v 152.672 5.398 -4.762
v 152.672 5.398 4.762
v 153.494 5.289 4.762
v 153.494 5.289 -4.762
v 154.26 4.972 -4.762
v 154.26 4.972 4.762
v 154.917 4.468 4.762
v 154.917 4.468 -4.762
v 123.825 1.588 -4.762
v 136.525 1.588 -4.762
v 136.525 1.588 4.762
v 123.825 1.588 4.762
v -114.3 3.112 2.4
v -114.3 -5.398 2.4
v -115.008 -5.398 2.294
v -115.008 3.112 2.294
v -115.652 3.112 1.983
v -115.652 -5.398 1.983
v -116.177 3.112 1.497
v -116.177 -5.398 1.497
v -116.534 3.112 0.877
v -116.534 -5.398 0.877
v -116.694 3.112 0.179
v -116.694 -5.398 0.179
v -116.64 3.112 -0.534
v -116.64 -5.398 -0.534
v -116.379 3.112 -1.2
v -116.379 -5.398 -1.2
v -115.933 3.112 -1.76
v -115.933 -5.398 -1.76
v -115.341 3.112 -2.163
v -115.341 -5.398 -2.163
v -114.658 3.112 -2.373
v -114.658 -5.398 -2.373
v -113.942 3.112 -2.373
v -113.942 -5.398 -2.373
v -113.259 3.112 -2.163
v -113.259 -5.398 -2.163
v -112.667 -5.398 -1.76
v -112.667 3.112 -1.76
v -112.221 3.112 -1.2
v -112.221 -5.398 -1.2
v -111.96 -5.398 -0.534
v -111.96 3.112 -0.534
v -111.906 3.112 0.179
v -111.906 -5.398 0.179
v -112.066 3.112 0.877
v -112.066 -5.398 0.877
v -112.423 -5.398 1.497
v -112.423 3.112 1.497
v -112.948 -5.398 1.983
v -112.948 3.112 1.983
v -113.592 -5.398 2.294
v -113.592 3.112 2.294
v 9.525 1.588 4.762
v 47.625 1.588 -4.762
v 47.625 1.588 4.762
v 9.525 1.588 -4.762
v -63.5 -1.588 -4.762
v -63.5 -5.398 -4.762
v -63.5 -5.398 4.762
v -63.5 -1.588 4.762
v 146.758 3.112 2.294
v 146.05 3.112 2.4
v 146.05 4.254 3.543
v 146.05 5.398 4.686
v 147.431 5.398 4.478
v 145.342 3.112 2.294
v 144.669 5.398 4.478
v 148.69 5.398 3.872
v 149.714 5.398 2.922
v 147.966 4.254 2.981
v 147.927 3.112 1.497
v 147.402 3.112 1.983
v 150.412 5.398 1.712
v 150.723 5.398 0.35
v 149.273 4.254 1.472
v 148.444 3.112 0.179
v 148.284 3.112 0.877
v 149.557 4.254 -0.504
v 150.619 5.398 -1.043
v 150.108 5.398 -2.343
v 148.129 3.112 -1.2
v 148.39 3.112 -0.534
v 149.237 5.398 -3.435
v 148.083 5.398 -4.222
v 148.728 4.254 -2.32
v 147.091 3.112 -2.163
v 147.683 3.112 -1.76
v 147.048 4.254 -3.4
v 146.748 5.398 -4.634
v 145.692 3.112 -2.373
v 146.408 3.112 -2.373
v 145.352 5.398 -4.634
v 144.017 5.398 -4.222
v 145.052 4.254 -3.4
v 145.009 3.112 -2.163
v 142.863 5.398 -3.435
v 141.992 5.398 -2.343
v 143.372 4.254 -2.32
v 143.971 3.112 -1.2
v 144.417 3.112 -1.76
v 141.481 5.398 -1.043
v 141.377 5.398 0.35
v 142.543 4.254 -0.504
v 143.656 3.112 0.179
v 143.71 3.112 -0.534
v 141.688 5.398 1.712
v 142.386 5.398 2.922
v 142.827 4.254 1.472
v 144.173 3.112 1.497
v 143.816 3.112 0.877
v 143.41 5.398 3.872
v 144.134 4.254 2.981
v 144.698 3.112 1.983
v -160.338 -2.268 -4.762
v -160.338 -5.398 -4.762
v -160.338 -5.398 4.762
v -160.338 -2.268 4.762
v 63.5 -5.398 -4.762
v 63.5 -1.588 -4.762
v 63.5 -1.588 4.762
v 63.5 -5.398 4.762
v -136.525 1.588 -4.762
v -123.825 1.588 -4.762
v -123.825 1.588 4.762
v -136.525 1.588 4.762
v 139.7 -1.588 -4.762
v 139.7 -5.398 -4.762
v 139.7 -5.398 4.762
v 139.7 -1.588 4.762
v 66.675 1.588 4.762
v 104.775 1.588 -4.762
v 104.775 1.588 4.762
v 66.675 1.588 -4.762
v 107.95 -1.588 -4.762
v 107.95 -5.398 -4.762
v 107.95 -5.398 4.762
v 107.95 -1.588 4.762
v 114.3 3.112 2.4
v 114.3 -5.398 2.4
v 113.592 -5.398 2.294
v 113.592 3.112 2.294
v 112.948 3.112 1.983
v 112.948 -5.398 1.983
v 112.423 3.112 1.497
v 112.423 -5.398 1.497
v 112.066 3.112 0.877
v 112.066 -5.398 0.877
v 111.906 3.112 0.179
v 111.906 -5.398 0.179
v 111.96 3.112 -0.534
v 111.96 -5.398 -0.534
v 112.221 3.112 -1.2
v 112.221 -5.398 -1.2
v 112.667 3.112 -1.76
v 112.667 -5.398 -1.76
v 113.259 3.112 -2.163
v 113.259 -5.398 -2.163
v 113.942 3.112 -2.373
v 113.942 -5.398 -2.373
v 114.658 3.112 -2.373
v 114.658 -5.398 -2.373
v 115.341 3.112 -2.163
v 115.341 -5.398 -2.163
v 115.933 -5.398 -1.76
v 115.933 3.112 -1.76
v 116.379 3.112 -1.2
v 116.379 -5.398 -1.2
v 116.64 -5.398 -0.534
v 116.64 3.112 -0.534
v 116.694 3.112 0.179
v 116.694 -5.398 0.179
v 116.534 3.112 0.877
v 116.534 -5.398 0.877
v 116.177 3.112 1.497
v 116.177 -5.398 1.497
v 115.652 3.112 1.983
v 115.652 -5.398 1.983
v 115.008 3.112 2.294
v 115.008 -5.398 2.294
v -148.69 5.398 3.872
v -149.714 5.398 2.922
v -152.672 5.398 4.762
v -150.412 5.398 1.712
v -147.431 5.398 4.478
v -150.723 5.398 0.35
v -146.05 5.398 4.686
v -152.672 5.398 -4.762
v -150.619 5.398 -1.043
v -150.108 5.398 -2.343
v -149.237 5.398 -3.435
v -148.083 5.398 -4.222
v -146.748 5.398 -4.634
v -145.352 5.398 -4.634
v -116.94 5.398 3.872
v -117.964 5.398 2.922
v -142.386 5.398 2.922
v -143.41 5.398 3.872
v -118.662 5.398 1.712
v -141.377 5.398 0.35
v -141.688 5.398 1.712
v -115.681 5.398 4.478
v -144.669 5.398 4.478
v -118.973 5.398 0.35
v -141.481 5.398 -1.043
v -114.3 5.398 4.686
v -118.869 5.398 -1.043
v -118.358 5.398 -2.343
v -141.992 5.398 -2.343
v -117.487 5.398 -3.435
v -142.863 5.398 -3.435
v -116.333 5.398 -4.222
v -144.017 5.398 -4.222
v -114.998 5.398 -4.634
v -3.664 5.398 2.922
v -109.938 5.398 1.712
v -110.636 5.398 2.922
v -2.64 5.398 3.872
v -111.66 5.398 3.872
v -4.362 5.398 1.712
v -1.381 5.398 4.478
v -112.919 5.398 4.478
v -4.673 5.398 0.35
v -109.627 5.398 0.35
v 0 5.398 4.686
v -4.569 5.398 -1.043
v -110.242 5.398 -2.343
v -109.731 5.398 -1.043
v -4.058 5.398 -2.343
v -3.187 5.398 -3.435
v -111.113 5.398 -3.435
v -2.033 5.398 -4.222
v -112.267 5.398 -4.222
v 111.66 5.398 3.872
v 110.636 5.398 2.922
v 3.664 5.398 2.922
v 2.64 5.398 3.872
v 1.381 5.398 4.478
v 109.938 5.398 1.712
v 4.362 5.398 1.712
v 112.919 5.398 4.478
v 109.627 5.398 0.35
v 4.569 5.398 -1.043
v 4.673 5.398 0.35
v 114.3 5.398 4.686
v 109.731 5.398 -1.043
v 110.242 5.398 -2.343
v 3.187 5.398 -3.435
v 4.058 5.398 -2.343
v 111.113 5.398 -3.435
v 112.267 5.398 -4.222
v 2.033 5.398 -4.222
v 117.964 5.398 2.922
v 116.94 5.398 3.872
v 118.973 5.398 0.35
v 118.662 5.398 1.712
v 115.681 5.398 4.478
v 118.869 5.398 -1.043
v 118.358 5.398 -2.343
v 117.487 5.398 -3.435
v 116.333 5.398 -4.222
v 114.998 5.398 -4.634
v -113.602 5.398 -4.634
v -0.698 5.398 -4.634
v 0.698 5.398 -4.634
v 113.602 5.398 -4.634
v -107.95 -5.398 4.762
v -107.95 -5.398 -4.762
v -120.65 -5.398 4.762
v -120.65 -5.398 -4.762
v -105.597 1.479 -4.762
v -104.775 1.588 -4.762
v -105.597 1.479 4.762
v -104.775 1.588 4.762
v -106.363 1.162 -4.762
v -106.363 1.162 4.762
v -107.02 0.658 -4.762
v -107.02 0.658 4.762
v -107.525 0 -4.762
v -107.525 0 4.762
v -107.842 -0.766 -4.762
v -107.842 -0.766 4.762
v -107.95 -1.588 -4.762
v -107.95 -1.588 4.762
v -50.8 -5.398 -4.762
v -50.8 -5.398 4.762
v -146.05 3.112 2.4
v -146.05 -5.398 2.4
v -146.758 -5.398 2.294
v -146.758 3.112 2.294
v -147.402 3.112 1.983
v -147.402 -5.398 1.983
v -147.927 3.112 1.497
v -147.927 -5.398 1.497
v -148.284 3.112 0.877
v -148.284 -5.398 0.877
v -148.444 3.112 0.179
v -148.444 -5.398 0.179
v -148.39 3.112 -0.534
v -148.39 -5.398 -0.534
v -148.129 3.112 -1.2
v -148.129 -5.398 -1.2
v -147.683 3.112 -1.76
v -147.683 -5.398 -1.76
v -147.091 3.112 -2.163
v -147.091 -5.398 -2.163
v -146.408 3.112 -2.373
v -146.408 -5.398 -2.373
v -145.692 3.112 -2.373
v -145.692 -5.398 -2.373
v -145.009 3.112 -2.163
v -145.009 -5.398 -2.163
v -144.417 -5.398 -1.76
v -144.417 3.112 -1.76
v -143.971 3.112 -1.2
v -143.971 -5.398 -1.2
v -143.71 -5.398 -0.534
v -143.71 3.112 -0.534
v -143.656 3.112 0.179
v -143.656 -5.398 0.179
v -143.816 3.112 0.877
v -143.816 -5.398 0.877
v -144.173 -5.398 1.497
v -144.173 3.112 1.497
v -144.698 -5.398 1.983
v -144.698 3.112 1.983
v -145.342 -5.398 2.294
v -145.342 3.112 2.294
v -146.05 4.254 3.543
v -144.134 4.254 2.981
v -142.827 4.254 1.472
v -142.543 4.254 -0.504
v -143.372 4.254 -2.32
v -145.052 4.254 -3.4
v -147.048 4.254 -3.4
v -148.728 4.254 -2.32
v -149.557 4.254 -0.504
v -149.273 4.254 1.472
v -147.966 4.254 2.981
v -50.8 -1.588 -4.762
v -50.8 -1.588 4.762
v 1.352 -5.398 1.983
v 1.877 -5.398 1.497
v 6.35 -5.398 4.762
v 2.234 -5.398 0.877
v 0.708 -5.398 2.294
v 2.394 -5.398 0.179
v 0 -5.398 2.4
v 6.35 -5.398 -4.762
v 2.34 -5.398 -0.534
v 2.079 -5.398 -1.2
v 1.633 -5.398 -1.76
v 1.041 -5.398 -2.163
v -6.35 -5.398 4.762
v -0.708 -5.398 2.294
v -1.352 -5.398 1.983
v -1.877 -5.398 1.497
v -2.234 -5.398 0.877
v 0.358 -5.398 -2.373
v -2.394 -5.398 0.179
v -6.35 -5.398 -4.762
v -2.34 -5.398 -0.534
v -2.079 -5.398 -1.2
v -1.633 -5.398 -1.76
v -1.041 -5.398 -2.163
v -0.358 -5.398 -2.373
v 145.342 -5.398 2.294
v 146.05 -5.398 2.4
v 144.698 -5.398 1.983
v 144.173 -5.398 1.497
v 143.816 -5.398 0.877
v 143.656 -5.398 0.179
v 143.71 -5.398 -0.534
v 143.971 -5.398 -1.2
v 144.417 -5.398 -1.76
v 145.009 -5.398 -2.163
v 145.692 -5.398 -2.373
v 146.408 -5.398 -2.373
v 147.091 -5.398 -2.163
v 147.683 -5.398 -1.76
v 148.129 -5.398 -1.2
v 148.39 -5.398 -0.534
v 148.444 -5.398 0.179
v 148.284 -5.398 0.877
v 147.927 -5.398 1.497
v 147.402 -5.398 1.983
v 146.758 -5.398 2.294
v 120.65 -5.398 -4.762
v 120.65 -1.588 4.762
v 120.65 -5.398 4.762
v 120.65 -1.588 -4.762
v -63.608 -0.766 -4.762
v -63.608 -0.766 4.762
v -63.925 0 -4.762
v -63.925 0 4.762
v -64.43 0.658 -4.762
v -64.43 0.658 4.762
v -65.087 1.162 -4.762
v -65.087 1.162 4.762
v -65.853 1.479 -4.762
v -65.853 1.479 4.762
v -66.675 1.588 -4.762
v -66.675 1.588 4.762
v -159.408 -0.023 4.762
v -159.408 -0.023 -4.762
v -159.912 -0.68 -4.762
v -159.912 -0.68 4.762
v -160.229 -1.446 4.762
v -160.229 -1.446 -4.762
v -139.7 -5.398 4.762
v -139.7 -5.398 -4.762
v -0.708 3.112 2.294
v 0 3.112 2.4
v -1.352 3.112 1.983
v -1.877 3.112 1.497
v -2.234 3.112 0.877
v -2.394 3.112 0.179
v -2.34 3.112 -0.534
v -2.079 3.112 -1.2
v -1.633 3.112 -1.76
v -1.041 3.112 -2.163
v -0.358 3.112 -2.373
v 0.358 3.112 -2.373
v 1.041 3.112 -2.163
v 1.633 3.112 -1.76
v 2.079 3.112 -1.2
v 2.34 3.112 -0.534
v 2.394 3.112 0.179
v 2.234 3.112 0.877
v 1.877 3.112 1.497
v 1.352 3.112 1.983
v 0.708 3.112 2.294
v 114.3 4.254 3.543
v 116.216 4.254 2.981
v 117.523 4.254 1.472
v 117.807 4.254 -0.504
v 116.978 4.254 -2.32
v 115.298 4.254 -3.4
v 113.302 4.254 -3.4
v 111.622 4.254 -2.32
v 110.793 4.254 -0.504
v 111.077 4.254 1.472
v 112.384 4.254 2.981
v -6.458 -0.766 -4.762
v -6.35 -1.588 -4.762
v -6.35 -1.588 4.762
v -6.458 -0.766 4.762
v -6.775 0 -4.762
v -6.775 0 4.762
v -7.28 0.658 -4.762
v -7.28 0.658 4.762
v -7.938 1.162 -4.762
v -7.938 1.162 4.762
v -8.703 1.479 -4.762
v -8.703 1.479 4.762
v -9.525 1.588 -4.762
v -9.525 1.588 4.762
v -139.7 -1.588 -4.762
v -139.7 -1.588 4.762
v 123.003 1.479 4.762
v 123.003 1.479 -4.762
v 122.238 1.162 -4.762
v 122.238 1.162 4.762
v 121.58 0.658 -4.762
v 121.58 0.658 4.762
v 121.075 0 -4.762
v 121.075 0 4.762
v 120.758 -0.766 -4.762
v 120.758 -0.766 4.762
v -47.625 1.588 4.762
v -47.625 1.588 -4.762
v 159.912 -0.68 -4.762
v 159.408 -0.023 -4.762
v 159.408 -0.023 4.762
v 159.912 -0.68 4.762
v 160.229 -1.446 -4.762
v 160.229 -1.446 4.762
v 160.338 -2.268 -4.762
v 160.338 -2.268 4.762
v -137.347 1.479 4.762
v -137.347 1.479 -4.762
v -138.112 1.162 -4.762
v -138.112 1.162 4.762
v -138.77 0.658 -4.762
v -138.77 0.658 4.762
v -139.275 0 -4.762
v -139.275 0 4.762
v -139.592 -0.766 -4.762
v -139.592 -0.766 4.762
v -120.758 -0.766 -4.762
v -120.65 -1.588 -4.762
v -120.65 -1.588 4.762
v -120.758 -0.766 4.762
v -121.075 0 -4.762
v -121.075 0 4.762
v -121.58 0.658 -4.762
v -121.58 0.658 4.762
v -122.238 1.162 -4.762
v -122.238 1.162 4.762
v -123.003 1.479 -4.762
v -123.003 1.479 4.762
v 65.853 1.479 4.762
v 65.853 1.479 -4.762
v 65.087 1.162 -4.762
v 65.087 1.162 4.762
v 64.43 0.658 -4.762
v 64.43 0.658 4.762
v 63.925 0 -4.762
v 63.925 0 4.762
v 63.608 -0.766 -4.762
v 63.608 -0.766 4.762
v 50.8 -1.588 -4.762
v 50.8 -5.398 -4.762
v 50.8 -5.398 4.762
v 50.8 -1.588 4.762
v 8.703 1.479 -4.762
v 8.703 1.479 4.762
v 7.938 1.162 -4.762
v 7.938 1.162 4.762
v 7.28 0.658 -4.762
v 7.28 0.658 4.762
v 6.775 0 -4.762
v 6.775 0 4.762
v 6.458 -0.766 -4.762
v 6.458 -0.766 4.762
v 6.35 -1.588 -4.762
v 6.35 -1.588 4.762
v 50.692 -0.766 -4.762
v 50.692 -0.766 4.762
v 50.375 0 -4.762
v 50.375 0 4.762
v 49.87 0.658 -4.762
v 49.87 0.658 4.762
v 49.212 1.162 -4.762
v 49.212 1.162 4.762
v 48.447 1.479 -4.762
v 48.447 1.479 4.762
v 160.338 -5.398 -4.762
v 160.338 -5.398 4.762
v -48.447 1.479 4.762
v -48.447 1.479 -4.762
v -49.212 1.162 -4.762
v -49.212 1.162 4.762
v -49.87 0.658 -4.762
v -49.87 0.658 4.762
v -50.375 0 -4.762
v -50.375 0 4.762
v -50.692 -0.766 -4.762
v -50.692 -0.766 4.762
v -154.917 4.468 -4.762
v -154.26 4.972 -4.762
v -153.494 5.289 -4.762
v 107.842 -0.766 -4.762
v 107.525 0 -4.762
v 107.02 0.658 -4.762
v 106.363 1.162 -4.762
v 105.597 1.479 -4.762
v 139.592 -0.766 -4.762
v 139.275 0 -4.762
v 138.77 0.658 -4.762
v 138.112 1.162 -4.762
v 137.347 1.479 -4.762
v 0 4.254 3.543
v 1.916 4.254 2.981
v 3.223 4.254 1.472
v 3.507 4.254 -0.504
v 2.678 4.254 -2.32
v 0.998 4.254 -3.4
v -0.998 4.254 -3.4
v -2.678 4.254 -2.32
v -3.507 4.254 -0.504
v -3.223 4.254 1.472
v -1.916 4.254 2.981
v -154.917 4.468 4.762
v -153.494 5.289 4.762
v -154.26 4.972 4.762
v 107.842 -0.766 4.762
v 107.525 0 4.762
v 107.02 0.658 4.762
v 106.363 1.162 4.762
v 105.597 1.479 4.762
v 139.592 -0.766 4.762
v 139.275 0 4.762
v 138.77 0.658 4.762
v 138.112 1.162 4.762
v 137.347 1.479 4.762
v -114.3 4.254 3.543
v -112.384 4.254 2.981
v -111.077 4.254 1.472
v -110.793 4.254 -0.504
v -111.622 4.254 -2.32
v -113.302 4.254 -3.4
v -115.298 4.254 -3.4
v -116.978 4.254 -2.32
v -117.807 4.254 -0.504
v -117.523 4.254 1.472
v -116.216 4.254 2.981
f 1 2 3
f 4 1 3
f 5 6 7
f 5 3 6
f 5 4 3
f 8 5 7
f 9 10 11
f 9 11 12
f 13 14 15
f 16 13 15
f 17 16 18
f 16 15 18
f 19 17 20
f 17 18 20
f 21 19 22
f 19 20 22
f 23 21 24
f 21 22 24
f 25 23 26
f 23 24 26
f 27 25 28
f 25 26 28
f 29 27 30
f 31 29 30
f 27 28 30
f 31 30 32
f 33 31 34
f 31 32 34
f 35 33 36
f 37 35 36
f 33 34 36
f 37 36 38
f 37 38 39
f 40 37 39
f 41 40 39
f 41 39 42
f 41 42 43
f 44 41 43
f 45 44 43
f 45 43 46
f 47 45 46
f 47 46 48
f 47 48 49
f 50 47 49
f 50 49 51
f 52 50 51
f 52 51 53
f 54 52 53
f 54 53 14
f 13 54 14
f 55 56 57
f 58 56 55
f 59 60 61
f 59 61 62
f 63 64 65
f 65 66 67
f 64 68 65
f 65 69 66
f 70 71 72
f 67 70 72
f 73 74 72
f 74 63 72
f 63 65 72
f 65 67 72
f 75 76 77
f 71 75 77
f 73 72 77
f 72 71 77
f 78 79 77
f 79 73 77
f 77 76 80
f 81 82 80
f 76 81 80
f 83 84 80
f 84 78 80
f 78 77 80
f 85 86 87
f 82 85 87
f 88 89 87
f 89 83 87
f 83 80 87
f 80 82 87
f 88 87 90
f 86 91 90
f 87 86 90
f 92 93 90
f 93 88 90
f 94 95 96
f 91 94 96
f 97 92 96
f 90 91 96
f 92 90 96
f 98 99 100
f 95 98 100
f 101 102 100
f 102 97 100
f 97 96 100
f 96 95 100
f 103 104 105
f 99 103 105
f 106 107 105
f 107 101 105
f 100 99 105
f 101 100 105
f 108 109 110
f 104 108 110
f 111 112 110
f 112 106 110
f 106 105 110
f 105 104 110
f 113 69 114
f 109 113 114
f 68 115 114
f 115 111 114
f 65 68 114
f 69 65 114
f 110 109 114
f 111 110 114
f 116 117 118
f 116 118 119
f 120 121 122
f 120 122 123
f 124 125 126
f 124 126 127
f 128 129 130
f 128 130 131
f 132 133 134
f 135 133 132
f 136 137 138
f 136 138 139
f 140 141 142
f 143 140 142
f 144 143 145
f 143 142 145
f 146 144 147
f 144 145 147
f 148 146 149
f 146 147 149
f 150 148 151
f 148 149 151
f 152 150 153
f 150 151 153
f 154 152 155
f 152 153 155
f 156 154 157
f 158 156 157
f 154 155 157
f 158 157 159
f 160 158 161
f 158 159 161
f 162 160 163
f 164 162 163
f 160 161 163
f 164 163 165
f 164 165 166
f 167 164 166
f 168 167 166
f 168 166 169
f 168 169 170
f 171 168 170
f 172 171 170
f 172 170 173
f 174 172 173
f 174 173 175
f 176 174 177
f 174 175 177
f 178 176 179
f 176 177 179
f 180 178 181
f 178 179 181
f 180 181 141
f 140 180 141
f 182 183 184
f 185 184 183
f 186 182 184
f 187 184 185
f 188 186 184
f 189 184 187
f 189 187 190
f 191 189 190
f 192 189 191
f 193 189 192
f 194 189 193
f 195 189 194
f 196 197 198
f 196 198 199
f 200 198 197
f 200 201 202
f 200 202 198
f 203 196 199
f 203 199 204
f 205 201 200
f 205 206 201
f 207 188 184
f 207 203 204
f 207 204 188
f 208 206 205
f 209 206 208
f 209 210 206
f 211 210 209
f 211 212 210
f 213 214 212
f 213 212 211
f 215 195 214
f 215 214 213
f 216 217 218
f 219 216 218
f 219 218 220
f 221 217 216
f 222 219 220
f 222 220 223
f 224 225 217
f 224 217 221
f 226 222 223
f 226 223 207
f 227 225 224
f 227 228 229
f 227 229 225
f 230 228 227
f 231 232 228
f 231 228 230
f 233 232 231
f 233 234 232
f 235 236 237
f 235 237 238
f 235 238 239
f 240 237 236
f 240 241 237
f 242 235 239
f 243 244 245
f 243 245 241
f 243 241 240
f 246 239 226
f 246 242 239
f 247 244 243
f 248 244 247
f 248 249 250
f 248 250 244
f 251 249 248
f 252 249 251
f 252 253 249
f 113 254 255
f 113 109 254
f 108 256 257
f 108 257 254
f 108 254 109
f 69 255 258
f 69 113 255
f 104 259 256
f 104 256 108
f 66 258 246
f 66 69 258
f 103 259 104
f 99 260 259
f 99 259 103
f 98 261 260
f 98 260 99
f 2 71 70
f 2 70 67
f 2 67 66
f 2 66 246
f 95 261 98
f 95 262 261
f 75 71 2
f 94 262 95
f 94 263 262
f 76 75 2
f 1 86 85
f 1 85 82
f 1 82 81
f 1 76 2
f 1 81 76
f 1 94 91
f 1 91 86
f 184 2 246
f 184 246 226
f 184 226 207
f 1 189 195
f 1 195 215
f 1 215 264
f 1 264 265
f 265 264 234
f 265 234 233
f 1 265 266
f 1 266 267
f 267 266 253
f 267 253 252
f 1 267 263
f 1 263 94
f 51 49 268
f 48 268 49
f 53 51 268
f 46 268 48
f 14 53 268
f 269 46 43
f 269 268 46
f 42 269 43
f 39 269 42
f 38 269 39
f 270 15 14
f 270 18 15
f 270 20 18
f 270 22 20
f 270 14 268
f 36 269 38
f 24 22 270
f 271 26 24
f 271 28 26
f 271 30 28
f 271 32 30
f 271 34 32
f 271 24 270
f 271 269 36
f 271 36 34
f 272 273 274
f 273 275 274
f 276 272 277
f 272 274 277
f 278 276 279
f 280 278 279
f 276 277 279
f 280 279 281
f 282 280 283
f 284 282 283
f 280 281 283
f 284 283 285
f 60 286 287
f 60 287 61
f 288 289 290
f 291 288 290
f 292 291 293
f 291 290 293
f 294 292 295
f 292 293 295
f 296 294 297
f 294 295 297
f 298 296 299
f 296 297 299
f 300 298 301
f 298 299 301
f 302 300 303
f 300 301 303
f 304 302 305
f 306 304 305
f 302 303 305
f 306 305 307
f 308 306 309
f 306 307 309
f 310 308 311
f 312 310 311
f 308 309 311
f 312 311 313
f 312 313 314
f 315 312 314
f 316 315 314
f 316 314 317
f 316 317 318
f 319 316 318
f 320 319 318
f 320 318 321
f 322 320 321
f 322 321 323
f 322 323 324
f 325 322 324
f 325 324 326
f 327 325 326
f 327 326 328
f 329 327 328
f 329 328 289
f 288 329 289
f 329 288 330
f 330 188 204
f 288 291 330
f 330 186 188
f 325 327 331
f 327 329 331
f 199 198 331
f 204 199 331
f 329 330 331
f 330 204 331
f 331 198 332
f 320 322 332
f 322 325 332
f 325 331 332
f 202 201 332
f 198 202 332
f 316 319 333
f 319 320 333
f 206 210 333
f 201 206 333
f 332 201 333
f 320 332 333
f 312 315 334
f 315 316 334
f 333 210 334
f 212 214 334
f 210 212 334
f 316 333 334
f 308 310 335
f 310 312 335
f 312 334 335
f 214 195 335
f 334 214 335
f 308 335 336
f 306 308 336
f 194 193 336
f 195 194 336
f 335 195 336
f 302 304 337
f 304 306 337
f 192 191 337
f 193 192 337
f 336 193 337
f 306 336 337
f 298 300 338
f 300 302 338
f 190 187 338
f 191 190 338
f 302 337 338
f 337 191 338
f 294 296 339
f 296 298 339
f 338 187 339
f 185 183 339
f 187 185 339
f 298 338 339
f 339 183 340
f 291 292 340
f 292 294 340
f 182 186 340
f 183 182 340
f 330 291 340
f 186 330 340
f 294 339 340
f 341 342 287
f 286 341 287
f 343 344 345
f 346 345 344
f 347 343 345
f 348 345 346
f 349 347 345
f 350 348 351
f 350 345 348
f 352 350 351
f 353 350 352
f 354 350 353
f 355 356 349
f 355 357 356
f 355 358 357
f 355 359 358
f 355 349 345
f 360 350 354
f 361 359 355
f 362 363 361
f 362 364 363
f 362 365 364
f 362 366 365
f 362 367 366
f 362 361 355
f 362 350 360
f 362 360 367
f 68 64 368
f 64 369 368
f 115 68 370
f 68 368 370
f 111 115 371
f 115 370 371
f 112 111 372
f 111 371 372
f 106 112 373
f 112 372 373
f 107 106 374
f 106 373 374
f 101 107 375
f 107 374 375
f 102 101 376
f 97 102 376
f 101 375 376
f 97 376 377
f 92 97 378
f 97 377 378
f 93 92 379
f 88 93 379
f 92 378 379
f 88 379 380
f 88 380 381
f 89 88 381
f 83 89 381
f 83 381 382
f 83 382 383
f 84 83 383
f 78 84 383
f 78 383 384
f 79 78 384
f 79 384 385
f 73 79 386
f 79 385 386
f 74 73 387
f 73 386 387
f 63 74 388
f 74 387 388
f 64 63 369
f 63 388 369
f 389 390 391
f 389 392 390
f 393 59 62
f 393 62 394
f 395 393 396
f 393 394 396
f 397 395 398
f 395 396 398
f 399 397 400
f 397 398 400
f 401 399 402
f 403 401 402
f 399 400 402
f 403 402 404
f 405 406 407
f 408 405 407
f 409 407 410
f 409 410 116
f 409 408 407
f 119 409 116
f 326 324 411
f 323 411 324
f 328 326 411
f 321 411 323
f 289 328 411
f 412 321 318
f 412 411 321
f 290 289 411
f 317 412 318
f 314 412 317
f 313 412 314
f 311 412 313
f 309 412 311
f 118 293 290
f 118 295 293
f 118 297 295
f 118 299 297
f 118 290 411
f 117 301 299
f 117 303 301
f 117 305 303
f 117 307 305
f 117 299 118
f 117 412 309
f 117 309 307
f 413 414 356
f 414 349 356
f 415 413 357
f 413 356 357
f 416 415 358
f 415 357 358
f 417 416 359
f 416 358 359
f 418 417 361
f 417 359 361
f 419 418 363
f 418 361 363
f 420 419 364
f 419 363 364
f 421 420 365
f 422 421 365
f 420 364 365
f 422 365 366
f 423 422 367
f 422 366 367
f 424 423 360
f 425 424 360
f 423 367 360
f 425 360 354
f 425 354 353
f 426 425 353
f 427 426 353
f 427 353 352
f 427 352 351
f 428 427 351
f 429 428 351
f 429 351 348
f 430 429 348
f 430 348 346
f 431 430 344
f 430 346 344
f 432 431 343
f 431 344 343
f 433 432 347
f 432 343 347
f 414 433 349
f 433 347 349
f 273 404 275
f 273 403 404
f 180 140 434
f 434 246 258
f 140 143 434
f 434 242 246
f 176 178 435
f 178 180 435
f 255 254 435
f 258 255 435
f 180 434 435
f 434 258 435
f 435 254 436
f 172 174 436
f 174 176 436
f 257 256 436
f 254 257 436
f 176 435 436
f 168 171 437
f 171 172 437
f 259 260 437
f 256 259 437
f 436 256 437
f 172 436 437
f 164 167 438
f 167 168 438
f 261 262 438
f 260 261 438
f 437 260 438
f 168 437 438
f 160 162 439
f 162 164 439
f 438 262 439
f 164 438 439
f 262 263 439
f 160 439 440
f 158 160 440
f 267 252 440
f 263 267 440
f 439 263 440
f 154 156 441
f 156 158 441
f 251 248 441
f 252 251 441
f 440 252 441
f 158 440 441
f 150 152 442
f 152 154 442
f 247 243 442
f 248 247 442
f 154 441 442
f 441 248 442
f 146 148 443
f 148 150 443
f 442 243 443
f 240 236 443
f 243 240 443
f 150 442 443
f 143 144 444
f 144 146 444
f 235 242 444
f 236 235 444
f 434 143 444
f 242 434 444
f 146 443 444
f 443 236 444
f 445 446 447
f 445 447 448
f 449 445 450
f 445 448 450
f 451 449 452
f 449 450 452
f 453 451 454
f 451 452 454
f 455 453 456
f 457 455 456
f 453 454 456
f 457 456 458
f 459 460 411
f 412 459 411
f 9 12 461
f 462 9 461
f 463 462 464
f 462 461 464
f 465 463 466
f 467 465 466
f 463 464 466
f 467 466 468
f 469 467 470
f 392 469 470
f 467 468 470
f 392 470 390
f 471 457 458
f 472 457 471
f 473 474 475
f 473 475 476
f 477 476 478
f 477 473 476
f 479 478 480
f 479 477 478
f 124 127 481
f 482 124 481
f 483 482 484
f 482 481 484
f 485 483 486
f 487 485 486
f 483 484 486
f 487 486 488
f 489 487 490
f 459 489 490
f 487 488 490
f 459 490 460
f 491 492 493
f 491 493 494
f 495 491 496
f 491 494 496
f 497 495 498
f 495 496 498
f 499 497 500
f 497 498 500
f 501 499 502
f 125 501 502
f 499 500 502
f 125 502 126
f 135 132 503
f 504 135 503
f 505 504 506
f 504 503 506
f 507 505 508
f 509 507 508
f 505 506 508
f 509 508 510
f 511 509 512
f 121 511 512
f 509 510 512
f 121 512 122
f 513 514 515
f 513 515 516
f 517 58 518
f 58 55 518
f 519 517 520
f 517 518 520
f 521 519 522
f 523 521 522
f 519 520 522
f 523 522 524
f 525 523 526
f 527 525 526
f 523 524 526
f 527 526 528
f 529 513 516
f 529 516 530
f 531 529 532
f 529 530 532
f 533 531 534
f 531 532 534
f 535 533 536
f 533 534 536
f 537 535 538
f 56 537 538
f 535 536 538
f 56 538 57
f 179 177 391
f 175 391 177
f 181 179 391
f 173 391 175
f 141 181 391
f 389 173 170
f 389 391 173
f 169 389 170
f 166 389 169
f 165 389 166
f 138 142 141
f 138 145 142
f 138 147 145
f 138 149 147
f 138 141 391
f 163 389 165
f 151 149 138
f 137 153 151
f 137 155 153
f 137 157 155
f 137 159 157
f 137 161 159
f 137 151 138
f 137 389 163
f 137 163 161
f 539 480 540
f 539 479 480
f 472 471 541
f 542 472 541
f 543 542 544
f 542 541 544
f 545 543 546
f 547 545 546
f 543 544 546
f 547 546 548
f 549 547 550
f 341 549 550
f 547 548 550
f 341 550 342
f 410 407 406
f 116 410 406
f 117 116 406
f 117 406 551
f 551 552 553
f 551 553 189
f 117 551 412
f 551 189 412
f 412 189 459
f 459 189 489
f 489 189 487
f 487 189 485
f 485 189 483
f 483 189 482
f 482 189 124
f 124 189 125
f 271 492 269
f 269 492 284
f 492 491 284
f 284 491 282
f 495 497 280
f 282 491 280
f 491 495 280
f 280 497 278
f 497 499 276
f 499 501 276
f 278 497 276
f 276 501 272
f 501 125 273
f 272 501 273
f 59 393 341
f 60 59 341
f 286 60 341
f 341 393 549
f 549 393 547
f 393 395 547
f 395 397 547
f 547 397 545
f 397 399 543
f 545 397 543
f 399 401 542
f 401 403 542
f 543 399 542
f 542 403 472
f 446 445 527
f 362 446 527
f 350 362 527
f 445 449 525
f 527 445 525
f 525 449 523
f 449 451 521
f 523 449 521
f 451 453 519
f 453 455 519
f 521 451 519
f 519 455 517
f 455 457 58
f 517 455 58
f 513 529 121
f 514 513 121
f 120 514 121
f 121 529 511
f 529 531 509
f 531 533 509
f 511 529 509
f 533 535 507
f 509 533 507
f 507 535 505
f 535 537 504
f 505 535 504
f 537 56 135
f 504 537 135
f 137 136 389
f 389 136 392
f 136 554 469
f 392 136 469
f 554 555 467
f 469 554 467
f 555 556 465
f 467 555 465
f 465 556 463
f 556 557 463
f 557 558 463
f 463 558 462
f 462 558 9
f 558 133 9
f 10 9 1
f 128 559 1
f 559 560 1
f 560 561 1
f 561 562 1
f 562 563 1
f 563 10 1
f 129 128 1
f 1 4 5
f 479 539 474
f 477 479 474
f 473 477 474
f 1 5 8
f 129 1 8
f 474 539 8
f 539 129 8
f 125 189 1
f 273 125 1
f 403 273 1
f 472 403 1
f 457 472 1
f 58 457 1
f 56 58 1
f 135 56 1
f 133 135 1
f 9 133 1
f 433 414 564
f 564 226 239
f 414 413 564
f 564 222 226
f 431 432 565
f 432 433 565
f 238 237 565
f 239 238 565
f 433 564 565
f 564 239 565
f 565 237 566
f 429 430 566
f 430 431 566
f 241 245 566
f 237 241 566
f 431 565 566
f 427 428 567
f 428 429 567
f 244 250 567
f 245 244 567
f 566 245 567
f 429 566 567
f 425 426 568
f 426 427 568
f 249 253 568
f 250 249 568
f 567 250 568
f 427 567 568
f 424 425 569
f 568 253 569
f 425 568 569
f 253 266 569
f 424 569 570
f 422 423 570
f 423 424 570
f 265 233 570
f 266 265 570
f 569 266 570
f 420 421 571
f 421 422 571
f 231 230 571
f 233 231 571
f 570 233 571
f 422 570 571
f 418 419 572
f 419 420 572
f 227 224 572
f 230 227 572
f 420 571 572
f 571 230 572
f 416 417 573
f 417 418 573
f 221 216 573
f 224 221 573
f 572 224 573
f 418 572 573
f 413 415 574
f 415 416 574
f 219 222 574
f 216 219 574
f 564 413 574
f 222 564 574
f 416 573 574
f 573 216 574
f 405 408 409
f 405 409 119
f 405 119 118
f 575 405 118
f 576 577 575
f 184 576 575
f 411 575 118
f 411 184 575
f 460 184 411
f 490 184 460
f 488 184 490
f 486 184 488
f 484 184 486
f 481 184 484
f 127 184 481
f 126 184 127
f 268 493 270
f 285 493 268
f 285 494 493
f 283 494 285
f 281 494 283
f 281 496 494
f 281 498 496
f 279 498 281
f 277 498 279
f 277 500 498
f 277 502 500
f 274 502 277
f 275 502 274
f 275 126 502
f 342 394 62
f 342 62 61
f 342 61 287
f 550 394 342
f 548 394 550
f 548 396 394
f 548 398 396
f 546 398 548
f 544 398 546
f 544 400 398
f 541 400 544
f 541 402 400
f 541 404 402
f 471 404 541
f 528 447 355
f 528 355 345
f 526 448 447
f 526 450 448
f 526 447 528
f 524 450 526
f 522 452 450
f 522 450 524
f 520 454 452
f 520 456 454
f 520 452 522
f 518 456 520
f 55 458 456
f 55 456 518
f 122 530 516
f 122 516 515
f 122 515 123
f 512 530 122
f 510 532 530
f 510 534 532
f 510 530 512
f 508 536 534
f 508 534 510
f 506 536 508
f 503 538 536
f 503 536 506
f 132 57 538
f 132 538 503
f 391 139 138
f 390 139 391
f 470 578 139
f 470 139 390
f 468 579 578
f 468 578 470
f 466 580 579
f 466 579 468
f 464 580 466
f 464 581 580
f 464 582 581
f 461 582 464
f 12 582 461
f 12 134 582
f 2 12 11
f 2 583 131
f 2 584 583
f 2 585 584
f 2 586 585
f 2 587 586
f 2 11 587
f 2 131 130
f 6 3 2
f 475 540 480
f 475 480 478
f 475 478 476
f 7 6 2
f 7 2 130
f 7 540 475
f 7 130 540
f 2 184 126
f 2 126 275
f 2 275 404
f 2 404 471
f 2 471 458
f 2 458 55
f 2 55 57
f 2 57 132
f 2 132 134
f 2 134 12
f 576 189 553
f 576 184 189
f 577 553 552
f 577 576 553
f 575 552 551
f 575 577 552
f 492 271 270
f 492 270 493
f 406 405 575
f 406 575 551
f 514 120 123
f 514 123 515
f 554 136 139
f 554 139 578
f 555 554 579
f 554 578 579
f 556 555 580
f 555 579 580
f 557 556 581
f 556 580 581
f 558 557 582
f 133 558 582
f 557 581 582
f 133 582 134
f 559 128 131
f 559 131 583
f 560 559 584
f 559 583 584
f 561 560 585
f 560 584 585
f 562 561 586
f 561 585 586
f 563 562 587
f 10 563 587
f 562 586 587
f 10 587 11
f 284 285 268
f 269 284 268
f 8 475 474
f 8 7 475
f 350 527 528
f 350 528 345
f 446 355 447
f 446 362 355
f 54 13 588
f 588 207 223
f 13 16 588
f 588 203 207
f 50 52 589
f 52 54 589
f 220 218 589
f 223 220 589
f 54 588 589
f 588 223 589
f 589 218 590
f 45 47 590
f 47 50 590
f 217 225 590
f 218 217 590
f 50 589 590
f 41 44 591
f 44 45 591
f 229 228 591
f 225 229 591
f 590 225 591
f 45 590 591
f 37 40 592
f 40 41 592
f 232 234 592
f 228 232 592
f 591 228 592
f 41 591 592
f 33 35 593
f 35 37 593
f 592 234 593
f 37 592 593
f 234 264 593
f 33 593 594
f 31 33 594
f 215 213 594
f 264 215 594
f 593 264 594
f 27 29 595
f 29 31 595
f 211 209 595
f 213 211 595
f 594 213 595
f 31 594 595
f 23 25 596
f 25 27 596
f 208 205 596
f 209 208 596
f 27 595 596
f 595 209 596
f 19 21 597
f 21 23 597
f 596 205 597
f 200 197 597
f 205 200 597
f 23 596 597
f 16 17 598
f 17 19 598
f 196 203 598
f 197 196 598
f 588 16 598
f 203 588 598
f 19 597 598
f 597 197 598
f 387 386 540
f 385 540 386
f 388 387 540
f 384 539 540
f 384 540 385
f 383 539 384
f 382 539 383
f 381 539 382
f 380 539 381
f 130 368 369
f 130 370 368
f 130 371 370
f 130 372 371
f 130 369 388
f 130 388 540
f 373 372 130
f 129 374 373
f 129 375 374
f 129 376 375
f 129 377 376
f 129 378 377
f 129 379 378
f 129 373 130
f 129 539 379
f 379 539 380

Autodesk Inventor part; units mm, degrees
ref_plane "YZ Plane" through (0, 0, 0) normal (1, 0, 0) x (0, 1, 0)
ref_plane "XY Plane" through (0, 0, 0) normal (0, 0, 1) x (1, 0, 0)
sketch "Sketch1" plane through (0, 0, 0) normal (0, 0, 1) x (1, 0, 0)
  line L0 (0, 7.5565) -> (0, -7.5565) projected
  line L1 (-224.4725, 0) -> (224.4725, 0) projected
  line L2 (160.3375, -5.3975) -> (-160.3375, -5.3975)
  line L3 (-160.3375, -5.3975) -> (-160.3375, 5.3975)
  line L4 (-160.3375, 5.3975) -> (160.3375, 5.3975)
  line L5 (160.3375, 5.3975) -> (160.3375, -5.3975)
  line L6 (160.3375, -5.3975) -> (-160.3375, 5.3975) construction
  line L7 (-160.3375, -5.3975) -> (160.3375, 5.3975) construction
  point P0 (0, 0)
  dimension "d0" = 320.675
  dimension "d1" = 10.795
extrude "Extrusion1" add sketch "Sketch1" along normal mid plane 9.525
sketch "Sketch2" plane through (0, 0, 0) normal (0, 0, 1) x (1, 0, 0)
  line L0 (-160.3375, 5.3975) -> (-160.3375, -5.3975) projected
  line L1 (-160.3375, -5.3975) -> (160.3375, -5.3975) projected
  line L2 (-160.3375, -5.3975) -> (160.3375, -5.3975) projected
  line L3 (160.3375, -5.3975) -> (160.3375, 5.3975) projected
  line L4 (160.3375, 5.3975) -> (-160.3375, 5.3975) projected
  line L5 (-160.3375, 5.3975) -> (-160.3375, -5.3975) projected
  line L6 (160.3375, -5.3975) -> (160.3375, 5.3975) projected
  line L7 (0, 7.5565) -> (0, -7.5565) projected
  line L8 (-139.7, -5.3975) -> (-120.65, -5.3975)
  line L9 (-120.65, -5.3975) -> (-120.65, 1.5875)
  line L10 (-120.65, 1.5875) -> (-139.7, 1.5875)
  line L11 (-139.7, 1.5875) -> (-139.7, -5.3975)
  line L12 (-107.95, -5.3975) -> (-63.5, -5.3975)
  line L13 (-63.5, -5.3975) -> (-63.5, 1.5875)
  line L14 (-63.5, 1.5875) -> (-107.95, 1.5875)
  line L15 (-107.95, 1.5875) -> (-107.95, -5.3975)
  line L16 (160.3375, 5.3975) -> (-160.3375, 5.3975) construction
  line L17 (-112.2997, -5.3975) -> (-116.3003, -5.3975) construction
  line L18 (-116.3003, -5.3975) -> (-116.3003, 5.3975) construction
  line L19 (-116.3003, 5.3975) -> (-112.2997, 5.3975) construction
  line L20 (-112.2997, 5.3975) -> (-112.2997, -5.3975) construction
  line L21 (-112.2997, -5.3975) -> (-116.3003, 5.3975) construction
  line L22 (-116.3003, -5.3975) -> (-112.2997, 5.3975) construction
  line L23 (-144.0497, -5.3975) -> (-148.0502, -5.3975) construction
  line L24 (-148.0502, -5.3975) -> (-148.0502, 5.3975) construction
  line L25 (-148.0502, 5.3975) -> (-144.0497, 5.3975) construction
  line L26 (-144.0497, 5.3975) -> (-144.0497, -5.3975) construction
  line L27 (-144.0497, -5.3975) -> (-148.0502, 5.3975) construction
  line L28 (-148.0502, -5.3975) -> (-144.0497, 5.3975) construction
  line L29 (2.0003, -5.3975) -> (-2.0002, -5.3975) construction
  line L30 (-2.0002, -5.3975) -> (-2.0003, 5.3975) construction
  line L31 (-2.0003, 5.3975) -> (2.0002, 5.3975) construction
  line L32 (2.0002, 5.3975) -> (2.0003, -5.3975) construction
  line L33 (2.0003, -5.3975) -> (-2.0003, 5.3975) construction
  line L34 (-2.0002, -5.3975) -> (2.0002, 5.3975) construction
  line L35 (116.3003, -5.3975) -> (112.2997, -5.3975) construction
  line L36 (112.2997, -5.3975) -> (112.2997, 5.3975) construction
  line L37 (112.2997, 5.3975) -> (116.3003, 5.3975) construction
  line L38 (116.3003, 5.3975) -> (116.3003, -5.3975) construction
  line L39 (116.3003, -5.3975) -> (112.2997, 5.3975) construction
  line L40 (112.2997, -5.3975) -> (116.3003, 5.3975) construction
  line L41 (148.0503, -5.3975) -> (144.0498, -5.3975) construction
  line L42 (144.0498, -5.3975) -> (144.0498, 5.3975) construction
  line L43 (144.0498, 5.3975) -> (148.0503, 5.3975) construction
  line L44 (148.0503, 5.3975) -> (148.0503, -5.3975) construction
  line L45 (148.0503, -5.3975) -> (144.0498, 5.3975) construction
  line L46 (144.0498, -5.3975) -> (148.0503, 5.3975) construction
  line L47 (-50.8, -5.3975) -> (-6.35, -5.3975)
  line L48 (-6.35, -5.3975) -> (-6.35, 1.5875)
  line L49 (-6.35, 1.5875) -> (-50.8, 1.5875)
  line L50 (-50.8, 1.5875) -> (-50.8, -5.3975)
  point P0 (0, 0)
  point P1 (-114.3, 0)
  point P2 (-146.05, 0)
  point P3 (114.3, 0)
  point P4 (146.05, 0)
  dimension "d4" = 320.675
  dimension "d5" = 4.0005
  dimension "d6" = 114.3
  dimension "d7" = 4.0005
  dimension "d8" = 31.75
  dimension "d9" = 4.0005
  dimension "d10" = 4.0005
  dimension "d11" = 114.3
  dimension "d12" = 4.0005
  dimension "d13" = 31.75
  dimension "d14" = 6.985
  dimension "d15" = 6.35
  dimension "d16" = 6.35
  dimension "d17" = 6.35
  dimension "d19" = 6.985
  dimension "d20" = 6.35
  dimension "d21" = 19.05
  dimension "d22" = 12.7
extrude "Extrusion2" cut sketch "Sketch2" along normal up to surface (9.525 mm away) from surface at -4.7625 contours L11 L10 L9 L1 | L1 L50 L49 L48 | L15 L14 L13 L1
chamfer "Chamfer1" distance 6.35 angle 45 1 edges at (-160.3375, 5.3975, 0)
mirror "Mirror1" about plane through (0, 0, 0) normal (1, 0, 0) of "Extrusion2"
fillet "Fillet1" radius 3.175 12 edges at (-139.7, 1.5875, 0) (-120.65, 1.5875, 0) (-107.95, 1.5875, 0) (-63.5, 1.5875, 0) (-50.8, 1.5875, 0) (-6.35, 1.5875, 0) (6.35, 1.5875, 0) (50.8, 1.5875, 0) (63.5, 1.5875, 0) (107.95, 1.5875, 0) (120.65, 1.5875, 0) (139.7, 1.5875, 0)
chamfer "Chamfer2" distance 6.35 angle 45 1 edges at (160.3375, 5.3975, 0)
fillet "Fillet2" radius 3.175 4 edges at (153.9875, 5.3975, 0) (160.3375, -0.9525, 0) (-160.3375, -0.9525, 0) (-153.9875, 5.3975, 0)
ref_plane "Work Plane1" through (0, 5.4102, 0) normal (0, 1, 0) x (-1, 0, 0)
sketch "Sketch3" plane through (0, 5.4102, 0) normal (0, 1, 0) x (-1, 0, 0)
  line L0 (0, -204.47) -> (0, 204.47) projected
  line L1 (-204.47, 0) -> (204.47, 0) projected
  point P0 (0, 0)
  point P1 (114.3, 0)
  point P2 (146.05, 0)
  point P3 (0, 0)
  point P4 (-146.05, 0)
  point P5 (-114.3, 0)
  dimension "d34" = 31.75
  dimension "d35" = 114.3
  dimension "d36" = 31.75
  dimension "d37" = 114.3
hole "Hole1" at (-114.3, 5.4102, 0) at (-146.05, 5.4102, 0) at (0, 5.4102, 0) at (146.05, 5.4102, 0) at (114.3, 5.4102, 0) direction (0, -1, 0) diameter 4.8006 end through all countersink diameter 9.398 countersink angle 90 clearance for "Flat Head Machine Screw" size "M4" standard "Ansi Metric M Profile"
properties part number "J005229" material "ACRYLIC, CLEAR"
